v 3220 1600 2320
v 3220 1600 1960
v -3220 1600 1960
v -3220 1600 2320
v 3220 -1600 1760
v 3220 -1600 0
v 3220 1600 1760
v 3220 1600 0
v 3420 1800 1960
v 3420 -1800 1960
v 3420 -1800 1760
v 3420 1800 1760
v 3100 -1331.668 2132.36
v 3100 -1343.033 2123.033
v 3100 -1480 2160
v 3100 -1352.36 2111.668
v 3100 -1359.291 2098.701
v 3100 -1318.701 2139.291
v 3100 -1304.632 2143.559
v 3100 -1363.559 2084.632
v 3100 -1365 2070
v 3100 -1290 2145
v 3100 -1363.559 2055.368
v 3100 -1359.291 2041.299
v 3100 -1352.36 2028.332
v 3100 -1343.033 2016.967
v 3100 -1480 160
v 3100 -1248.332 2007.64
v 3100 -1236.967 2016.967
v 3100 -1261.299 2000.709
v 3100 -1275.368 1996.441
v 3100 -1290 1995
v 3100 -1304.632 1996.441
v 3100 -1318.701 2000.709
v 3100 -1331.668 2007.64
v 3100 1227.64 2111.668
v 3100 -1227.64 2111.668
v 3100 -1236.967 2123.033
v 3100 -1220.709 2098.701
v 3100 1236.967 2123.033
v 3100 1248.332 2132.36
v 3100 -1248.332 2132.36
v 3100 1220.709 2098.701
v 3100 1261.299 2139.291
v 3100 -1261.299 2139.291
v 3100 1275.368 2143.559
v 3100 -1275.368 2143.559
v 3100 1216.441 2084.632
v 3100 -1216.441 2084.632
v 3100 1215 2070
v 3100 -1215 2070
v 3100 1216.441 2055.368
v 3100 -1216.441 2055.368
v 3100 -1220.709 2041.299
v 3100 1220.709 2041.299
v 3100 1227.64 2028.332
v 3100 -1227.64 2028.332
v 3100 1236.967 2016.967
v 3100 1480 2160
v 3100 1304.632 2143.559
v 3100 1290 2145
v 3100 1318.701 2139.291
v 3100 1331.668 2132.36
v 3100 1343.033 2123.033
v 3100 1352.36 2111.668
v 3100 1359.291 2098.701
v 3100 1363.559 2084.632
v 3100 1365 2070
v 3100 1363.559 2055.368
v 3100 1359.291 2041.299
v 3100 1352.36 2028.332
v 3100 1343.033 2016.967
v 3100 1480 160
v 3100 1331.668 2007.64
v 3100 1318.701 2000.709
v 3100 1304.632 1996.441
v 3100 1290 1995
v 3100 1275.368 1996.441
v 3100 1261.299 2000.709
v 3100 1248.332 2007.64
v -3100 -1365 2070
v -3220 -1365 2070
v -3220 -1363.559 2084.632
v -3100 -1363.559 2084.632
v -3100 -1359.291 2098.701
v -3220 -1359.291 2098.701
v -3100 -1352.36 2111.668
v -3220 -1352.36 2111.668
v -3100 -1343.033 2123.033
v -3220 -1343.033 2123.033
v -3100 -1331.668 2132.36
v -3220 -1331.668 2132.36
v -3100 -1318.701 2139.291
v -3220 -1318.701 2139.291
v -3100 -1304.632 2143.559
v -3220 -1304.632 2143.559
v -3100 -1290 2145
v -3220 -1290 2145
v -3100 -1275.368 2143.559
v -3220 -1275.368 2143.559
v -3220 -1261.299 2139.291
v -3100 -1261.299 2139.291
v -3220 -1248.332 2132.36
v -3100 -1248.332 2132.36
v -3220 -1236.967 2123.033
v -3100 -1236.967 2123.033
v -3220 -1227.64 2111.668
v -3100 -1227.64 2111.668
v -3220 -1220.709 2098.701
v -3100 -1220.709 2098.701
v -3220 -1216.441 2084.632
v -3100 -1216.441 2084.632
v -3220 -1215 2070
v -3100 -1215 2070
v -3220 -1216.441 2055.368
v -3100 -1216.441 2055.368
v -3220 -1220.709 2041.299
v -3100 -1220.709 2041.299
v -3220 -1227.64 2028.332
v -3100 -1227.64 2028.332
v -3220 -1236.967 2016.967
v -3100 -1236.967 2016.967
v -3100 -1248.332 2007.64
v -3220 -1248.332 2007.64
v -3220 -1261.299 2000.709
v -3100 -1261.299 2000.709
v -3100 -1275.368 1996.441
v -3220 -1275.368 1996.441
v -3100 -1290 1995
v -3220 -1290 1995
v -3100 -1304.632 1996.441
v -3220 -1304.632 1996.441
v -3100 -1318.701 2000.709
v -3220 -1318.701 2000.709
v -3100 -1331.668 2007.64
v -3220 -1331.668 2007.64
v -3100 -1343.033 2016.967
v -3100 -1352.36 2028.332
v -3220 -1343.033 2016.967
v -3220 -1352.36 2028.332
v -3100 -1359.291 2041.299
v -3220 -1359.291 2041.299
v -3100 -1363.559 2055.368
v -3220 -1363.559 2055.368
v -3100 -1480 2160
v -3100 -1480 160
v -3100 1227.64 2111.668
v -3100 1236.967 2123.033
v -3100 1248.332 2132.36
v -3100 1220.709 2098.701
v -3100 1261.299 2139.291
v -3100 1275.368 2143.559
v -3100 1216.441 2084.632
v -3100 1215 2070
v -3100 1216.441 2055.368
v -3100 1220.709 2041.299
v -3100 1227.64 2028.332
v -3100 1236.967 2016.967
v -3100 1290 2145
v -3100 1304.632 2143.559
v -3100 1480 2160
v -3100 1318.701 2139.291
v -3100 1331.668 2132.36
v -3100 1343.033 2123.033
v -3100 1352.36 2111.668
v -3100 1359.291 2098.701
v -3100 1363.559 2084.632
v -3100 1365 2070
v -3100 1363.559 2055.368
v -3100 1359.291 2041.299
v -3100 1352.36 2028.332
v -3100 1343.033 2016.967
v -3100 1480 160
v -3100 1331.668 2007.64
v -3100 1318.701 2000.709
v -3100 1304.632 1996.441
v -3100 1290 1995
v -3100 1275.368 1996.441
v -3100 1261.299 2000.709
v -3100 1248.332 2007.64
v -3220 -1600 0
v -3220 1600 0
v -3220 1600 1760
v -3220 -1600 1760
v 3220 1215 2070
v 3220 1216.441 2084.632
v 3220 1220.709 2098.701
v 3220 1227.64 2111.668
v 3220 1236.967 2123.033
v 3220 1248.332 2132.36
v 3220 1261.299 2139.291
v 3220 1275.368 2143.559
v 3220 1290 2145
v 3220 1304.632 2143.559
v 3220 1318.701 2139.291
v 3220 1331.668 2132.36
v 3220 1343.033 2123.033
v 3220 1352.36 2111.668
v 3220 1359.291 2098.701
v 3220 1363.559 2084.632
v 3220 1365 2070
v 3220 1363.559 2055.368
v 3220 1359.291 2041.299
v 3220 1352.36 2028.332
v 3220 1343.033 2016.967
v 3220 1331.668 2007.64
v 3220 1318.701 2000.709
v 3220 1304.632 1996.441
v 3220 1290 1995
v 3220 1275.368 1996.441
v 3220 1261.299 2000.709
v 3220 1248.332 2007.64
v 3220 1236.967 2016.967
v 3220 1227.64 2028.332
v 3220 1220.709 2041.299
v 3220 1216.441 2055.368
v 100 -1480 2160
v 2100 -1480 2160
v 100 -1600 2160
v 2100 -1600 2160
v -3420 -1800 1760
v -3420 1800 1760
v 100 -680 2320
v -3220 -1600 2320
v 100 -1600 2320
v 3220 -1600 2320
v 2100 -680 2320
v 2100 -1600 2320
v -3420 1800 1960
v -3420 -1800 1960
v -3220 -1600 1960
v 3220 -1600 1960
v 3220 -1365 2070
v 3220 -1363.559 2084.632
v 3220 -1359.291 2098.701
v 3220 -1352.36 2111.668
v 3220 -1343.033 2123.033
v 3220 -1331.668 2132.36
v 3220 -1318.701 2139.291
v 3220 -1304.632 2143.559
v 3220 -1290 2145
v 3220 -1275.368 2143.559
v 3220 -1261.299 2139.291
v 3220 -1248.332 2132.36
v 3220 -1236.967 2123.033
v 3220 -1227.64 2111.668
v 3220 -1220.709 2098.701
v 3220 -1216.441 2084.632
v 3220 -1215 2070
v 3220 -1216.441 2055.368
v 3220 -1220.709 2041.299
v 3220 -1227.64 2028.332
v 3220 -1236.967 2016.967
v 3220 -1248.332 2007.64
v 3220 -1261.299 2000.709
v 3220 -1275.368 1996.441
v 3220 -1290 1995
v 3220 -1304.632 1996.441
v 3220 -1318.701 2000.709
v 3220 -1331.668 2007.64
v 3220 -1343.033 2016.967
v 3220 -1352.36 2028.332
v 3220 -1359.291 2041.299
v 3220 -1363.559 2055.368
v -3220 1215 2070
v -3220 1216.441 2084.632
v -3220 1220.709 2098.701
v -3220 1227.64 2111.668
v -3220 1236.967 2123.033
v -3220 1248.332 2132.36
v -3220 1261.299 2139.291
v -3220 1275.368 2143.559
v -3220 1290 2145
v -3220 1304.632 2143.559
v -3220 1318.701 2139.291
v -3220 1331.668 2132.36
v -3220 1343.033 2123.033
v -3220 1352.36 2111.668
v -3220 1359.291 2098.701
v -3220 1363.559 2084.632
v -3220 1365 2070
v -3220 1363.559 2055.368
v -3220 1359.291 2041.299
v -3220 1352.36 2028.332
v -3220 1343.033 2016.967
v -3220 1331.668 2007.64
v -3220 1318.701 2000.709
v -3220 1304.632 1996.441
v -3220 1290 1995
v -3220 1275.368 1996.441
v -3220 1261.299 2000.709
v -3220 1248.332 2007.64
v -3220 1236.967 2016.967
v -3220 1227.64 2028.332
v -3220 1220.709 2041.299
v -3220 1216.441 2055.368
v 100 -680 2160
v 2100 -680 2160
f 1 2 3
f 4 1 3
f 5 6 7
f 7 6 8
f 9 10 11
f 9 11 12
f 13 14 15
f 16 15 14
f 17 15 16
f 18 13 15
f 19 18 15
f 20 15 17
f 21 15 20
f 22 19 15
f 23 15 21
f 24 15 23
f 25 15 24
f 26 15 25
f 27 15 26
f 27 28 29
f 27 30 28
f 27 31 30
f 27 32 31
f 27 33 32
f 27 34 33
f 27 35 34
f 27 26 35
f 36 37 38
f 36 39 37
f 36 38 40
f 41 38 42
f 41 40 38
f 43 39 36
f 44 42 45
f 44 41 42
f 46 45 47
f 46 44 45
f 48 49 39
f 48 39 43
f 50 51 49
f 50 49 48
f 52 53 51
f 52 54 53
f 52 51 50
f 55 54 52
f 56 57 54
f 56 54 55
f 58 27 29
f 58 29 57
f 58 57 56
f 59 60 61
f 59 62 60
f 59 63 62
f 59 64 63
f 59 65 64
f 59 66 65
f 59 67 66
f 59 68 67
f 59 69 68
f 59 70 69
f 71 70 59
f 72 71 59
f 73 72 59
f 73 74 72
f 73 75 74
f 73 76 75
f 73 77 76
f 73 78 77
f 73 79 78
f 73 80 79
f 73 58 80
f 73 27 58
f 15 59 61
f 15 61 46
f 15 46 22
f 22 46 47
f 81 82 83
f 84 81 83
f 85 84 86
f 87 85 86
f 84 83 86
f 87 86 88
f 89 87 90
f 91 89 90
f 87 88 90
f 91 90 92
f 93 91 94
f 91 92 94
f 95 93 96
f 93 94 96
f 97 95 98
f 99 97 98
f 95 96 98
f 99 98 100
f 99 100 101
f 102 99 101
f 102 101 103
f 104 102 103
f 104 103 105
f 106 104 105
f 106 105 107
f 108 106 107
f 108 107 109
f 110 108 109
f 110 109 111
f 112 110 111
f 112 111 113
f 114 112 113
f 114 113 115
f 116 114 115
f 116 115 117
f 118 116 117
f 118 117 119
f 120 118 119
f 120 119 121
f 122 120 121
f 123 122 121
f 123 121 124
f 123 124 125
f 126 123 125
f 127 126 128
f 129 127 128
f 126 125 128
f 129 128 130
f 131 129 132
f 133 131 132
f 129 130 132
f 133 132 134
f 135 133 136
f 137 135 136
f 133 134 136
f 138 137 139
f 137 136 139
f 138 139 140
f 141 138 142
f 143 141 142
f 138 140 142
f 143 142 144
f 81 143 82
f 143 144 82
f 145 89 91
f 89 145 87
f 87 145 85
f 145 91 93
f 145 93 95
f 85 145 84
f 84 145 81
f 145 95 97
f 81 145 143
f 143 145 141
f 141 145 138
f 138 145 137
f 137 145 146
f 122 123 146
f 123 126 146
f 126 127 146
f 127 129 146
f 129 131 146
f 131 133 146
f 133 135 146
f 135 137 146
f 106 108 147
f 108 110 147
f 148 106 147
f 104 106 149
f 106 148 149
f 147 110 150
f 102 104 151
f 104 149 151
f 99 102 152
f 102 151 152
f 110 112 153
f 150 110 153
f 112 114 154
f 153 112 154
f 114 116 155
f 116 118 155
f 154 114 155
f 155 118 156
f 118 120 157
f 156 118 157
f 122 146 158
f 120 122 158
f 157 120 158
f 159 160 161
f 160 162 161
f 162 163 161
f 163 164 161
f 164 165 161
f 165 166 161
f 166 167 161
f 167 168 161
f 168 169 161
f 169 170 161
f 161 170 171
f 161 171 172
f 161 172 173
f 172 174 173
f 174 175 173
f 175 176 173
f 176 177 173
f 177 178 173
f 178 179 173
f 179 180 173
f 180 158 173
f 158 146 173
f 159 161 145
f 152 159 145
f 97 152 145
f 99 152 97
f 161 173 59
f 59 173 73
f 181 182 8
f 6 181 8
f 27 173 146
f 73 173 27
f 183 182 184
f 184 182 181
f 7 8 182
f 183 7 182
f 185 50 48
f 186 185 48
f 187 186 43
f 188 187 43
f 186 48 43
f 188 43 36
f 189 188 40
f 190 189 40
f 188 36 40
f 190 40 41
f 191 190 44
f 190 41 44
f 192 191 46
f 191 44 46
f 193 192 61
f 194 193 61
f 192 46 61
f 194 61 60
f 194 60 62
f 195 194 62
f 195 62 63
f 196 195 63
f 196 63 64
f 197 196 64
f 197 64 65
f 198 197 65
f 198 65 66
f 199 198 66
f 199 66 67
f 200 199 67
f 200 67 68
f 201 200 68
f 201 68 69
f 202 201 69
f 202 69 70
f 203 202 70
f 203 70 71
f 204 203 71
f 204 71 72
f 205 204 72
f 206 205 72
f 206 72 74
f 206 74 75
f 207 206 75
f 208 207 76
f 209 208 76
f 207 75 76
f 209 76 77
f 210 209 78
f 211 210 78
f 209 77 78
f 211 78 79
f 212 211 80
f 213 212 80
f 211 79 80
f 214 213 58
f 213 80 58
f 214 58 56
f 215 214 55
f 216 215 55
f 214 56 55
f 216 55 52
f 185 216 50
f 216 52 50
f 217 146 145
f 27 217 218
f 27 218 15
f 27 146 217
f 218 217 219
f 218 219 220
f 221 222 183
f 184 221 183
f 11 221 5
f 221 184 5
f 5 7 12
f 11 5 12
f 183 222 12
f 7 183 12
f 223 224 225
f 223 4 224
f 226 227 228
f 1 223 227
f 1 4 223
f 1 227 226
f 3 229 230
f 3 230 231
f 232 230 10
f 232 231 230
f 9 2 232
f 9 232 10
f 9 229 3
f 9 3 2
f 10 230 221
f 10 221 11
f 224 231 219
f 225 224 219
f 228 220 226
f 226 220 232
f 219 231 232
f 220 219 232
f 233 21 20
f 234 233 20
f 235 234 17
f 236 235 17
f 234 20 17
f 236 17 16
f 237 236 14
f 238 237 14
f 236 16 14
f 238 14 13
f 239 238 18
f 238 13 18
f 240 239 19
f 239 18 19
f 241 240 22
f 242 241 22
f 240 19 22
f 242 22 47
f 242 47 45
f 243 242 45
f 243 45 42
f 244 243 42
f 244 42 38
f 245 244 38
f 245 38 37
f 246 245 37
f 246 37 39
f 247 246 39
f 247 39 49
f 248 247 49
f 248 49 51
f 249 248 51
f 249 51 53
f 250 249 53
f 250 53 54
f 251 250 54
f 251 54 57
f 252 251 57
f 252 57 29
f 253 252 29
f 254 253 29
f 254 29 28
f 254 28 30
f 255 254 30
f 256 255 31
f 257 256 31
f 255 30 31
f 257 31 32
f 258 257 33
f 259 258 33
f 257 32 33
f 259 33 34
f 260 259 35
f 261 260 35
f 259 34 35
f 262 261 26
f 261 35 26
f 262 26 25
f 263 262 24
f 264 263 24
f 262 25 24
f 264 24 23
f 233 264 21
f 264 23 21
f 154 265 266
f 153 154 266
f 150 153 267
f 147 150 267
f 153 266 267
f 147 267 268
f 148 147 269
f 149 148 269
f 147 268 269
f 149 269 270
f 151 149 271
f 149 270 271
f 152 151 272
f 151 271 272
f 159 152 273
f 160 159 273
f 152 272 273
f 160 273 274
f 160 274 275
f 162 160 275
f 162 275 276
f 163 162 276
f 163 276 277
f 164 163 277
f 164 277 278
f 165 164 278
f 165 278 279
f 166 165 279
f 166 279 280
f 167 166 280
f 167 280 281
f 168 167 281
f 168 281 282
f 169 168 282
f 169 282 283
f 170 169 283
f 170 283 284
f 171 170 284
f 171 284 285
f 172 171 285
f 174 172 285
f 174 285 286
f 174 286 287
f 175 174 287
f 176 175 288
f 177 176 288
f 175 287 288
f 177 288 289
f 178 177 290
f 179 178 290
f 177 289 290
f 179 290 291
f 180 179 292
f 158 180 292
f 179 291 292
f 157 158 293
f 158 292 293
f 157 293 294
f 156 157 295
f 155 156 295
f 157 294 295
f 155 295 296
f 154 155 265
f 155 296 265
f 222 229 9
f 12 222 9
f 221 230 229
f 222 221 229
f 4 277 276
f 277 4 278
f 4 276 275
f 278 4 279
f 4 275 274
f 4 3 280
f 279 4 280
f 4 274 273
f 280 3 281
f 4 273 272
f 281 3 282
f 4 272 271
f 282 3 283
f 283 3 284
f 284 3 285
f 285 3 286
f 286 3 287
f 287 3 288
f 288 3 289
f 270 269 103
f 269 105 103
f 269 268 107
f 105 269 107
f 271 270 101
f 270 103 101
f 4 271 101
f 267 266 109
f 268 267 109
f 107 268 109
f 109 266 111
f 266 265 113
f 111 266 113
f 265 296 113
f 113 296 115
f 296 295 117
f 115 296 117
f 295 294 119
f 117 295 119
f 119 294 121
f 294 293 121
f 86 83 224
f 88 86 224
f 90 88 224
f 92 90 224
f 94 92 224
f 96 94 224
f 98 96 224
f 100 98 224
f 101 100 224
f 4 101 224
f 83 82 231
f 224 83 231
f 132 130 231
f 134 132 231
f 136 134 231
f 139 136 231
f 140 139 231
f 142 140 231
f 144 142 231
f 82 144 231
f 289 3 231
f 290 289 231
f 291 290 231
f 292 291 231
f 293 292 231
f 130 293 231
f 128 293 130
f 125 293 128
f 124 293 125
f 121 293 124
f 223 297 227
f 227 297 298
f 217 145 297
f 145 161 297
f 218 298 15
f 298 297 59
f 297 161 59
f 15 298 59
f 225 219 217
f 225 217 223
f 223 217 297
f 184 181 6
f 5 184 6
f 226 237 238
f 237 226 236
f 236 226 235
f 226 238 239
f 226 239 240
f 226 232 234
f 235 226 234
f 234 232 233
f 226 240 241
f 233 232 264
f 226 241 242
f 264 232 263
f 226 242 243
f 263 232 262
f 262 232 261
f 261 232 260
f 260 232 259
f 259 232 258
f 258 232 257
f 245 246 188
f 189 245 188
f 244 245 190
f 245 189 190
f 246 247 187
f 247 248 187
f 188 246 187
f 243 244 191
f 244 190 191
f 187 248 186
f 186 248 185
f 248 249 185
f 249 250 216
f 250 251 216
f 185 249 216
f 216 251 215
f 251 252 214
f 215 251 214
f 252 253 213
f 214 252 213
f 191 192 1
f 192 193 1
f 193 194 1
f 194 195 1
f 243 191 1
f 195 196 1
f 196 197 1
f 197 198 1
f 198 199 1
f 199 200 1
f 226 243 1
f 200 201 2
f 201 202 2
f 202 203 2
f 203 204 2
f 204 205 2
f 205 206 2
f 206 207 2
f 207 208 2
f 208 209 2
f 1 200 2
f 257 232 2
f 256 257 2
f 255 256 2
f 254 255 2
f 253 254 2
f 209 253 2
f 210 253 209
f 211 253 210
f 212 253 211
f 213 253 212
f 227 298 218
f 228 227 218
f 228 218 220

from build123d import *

# Parameters (mm, degrees)
F0_W      = 6440
F0_H      = 3200
F1_DEPTH  = 160
F2_W      = 6440
F2_H      = 3200
F2_W_2    = 6200
F2_H_2    = 2960
F3_DEPTH  = 2000
F5_DEPTH  = 160
F6_R      = 75
F7_DEPTH  = 6440.001
F9_W      = 6840
F9_H      = 3600
F9_W_2    = 6440
F9_H_2    = 3200
F10_DEPTH = 200


with BuildPart() as f1:
    # F0 (on Top) → F1 (new body)
    with BuildSketch(Plane.XY):
        Rectangle(F0_W, F0_H)
    extrude(amount=F1_DEPTH)

    # F2 (on face) → F3 (join)
    with BuildSketch(Plane.XY.offset(160)):
        Rectangle(F2_W, F2_H)
        Rectangle(F2_W_2, F2_H_2, mode=Mode.SUBTRACT)
    extrude(amount=F3_DEPTH)

    # F4 (on face) → F5 (join)
    with BuildSketch(Plane.XY.offset(2160)):
        Polygon((-3220, -1600), (100, -1600), (100, -680), (2100, -680), (2100, -1600), (3220, -1600), (3220, 1600), (-3220, 1600), align=None)
    extrude(amount=F5_DEPTH)

    # F6 (on face) → F7 (cut, through all)
    with BuildSketch(Plane(origin=(-3220, 0, 0), x_dir=(0, -1, 0), z_dir=(-1, 0, 0))):
        with Locations((-1290, 2070)):
            Circle(F6_R)
        with Locations((1290, 2070)):
            Circle(F6_R)
    extrude(amount=-F7_DEPTH, mode=Mode.SUBTRACT)

    # F9 (on offset) → F10 (join)
    with BuildSketch(Plane.XY.offset(1960)):
        Rectangle(F9_W, F9_H)
        Rectangle(F9_W_2, F9_H_2, mode=Mode.SUBTRACT)
    extrude(amount=-F10_DEPTH)


solid = f1.part
